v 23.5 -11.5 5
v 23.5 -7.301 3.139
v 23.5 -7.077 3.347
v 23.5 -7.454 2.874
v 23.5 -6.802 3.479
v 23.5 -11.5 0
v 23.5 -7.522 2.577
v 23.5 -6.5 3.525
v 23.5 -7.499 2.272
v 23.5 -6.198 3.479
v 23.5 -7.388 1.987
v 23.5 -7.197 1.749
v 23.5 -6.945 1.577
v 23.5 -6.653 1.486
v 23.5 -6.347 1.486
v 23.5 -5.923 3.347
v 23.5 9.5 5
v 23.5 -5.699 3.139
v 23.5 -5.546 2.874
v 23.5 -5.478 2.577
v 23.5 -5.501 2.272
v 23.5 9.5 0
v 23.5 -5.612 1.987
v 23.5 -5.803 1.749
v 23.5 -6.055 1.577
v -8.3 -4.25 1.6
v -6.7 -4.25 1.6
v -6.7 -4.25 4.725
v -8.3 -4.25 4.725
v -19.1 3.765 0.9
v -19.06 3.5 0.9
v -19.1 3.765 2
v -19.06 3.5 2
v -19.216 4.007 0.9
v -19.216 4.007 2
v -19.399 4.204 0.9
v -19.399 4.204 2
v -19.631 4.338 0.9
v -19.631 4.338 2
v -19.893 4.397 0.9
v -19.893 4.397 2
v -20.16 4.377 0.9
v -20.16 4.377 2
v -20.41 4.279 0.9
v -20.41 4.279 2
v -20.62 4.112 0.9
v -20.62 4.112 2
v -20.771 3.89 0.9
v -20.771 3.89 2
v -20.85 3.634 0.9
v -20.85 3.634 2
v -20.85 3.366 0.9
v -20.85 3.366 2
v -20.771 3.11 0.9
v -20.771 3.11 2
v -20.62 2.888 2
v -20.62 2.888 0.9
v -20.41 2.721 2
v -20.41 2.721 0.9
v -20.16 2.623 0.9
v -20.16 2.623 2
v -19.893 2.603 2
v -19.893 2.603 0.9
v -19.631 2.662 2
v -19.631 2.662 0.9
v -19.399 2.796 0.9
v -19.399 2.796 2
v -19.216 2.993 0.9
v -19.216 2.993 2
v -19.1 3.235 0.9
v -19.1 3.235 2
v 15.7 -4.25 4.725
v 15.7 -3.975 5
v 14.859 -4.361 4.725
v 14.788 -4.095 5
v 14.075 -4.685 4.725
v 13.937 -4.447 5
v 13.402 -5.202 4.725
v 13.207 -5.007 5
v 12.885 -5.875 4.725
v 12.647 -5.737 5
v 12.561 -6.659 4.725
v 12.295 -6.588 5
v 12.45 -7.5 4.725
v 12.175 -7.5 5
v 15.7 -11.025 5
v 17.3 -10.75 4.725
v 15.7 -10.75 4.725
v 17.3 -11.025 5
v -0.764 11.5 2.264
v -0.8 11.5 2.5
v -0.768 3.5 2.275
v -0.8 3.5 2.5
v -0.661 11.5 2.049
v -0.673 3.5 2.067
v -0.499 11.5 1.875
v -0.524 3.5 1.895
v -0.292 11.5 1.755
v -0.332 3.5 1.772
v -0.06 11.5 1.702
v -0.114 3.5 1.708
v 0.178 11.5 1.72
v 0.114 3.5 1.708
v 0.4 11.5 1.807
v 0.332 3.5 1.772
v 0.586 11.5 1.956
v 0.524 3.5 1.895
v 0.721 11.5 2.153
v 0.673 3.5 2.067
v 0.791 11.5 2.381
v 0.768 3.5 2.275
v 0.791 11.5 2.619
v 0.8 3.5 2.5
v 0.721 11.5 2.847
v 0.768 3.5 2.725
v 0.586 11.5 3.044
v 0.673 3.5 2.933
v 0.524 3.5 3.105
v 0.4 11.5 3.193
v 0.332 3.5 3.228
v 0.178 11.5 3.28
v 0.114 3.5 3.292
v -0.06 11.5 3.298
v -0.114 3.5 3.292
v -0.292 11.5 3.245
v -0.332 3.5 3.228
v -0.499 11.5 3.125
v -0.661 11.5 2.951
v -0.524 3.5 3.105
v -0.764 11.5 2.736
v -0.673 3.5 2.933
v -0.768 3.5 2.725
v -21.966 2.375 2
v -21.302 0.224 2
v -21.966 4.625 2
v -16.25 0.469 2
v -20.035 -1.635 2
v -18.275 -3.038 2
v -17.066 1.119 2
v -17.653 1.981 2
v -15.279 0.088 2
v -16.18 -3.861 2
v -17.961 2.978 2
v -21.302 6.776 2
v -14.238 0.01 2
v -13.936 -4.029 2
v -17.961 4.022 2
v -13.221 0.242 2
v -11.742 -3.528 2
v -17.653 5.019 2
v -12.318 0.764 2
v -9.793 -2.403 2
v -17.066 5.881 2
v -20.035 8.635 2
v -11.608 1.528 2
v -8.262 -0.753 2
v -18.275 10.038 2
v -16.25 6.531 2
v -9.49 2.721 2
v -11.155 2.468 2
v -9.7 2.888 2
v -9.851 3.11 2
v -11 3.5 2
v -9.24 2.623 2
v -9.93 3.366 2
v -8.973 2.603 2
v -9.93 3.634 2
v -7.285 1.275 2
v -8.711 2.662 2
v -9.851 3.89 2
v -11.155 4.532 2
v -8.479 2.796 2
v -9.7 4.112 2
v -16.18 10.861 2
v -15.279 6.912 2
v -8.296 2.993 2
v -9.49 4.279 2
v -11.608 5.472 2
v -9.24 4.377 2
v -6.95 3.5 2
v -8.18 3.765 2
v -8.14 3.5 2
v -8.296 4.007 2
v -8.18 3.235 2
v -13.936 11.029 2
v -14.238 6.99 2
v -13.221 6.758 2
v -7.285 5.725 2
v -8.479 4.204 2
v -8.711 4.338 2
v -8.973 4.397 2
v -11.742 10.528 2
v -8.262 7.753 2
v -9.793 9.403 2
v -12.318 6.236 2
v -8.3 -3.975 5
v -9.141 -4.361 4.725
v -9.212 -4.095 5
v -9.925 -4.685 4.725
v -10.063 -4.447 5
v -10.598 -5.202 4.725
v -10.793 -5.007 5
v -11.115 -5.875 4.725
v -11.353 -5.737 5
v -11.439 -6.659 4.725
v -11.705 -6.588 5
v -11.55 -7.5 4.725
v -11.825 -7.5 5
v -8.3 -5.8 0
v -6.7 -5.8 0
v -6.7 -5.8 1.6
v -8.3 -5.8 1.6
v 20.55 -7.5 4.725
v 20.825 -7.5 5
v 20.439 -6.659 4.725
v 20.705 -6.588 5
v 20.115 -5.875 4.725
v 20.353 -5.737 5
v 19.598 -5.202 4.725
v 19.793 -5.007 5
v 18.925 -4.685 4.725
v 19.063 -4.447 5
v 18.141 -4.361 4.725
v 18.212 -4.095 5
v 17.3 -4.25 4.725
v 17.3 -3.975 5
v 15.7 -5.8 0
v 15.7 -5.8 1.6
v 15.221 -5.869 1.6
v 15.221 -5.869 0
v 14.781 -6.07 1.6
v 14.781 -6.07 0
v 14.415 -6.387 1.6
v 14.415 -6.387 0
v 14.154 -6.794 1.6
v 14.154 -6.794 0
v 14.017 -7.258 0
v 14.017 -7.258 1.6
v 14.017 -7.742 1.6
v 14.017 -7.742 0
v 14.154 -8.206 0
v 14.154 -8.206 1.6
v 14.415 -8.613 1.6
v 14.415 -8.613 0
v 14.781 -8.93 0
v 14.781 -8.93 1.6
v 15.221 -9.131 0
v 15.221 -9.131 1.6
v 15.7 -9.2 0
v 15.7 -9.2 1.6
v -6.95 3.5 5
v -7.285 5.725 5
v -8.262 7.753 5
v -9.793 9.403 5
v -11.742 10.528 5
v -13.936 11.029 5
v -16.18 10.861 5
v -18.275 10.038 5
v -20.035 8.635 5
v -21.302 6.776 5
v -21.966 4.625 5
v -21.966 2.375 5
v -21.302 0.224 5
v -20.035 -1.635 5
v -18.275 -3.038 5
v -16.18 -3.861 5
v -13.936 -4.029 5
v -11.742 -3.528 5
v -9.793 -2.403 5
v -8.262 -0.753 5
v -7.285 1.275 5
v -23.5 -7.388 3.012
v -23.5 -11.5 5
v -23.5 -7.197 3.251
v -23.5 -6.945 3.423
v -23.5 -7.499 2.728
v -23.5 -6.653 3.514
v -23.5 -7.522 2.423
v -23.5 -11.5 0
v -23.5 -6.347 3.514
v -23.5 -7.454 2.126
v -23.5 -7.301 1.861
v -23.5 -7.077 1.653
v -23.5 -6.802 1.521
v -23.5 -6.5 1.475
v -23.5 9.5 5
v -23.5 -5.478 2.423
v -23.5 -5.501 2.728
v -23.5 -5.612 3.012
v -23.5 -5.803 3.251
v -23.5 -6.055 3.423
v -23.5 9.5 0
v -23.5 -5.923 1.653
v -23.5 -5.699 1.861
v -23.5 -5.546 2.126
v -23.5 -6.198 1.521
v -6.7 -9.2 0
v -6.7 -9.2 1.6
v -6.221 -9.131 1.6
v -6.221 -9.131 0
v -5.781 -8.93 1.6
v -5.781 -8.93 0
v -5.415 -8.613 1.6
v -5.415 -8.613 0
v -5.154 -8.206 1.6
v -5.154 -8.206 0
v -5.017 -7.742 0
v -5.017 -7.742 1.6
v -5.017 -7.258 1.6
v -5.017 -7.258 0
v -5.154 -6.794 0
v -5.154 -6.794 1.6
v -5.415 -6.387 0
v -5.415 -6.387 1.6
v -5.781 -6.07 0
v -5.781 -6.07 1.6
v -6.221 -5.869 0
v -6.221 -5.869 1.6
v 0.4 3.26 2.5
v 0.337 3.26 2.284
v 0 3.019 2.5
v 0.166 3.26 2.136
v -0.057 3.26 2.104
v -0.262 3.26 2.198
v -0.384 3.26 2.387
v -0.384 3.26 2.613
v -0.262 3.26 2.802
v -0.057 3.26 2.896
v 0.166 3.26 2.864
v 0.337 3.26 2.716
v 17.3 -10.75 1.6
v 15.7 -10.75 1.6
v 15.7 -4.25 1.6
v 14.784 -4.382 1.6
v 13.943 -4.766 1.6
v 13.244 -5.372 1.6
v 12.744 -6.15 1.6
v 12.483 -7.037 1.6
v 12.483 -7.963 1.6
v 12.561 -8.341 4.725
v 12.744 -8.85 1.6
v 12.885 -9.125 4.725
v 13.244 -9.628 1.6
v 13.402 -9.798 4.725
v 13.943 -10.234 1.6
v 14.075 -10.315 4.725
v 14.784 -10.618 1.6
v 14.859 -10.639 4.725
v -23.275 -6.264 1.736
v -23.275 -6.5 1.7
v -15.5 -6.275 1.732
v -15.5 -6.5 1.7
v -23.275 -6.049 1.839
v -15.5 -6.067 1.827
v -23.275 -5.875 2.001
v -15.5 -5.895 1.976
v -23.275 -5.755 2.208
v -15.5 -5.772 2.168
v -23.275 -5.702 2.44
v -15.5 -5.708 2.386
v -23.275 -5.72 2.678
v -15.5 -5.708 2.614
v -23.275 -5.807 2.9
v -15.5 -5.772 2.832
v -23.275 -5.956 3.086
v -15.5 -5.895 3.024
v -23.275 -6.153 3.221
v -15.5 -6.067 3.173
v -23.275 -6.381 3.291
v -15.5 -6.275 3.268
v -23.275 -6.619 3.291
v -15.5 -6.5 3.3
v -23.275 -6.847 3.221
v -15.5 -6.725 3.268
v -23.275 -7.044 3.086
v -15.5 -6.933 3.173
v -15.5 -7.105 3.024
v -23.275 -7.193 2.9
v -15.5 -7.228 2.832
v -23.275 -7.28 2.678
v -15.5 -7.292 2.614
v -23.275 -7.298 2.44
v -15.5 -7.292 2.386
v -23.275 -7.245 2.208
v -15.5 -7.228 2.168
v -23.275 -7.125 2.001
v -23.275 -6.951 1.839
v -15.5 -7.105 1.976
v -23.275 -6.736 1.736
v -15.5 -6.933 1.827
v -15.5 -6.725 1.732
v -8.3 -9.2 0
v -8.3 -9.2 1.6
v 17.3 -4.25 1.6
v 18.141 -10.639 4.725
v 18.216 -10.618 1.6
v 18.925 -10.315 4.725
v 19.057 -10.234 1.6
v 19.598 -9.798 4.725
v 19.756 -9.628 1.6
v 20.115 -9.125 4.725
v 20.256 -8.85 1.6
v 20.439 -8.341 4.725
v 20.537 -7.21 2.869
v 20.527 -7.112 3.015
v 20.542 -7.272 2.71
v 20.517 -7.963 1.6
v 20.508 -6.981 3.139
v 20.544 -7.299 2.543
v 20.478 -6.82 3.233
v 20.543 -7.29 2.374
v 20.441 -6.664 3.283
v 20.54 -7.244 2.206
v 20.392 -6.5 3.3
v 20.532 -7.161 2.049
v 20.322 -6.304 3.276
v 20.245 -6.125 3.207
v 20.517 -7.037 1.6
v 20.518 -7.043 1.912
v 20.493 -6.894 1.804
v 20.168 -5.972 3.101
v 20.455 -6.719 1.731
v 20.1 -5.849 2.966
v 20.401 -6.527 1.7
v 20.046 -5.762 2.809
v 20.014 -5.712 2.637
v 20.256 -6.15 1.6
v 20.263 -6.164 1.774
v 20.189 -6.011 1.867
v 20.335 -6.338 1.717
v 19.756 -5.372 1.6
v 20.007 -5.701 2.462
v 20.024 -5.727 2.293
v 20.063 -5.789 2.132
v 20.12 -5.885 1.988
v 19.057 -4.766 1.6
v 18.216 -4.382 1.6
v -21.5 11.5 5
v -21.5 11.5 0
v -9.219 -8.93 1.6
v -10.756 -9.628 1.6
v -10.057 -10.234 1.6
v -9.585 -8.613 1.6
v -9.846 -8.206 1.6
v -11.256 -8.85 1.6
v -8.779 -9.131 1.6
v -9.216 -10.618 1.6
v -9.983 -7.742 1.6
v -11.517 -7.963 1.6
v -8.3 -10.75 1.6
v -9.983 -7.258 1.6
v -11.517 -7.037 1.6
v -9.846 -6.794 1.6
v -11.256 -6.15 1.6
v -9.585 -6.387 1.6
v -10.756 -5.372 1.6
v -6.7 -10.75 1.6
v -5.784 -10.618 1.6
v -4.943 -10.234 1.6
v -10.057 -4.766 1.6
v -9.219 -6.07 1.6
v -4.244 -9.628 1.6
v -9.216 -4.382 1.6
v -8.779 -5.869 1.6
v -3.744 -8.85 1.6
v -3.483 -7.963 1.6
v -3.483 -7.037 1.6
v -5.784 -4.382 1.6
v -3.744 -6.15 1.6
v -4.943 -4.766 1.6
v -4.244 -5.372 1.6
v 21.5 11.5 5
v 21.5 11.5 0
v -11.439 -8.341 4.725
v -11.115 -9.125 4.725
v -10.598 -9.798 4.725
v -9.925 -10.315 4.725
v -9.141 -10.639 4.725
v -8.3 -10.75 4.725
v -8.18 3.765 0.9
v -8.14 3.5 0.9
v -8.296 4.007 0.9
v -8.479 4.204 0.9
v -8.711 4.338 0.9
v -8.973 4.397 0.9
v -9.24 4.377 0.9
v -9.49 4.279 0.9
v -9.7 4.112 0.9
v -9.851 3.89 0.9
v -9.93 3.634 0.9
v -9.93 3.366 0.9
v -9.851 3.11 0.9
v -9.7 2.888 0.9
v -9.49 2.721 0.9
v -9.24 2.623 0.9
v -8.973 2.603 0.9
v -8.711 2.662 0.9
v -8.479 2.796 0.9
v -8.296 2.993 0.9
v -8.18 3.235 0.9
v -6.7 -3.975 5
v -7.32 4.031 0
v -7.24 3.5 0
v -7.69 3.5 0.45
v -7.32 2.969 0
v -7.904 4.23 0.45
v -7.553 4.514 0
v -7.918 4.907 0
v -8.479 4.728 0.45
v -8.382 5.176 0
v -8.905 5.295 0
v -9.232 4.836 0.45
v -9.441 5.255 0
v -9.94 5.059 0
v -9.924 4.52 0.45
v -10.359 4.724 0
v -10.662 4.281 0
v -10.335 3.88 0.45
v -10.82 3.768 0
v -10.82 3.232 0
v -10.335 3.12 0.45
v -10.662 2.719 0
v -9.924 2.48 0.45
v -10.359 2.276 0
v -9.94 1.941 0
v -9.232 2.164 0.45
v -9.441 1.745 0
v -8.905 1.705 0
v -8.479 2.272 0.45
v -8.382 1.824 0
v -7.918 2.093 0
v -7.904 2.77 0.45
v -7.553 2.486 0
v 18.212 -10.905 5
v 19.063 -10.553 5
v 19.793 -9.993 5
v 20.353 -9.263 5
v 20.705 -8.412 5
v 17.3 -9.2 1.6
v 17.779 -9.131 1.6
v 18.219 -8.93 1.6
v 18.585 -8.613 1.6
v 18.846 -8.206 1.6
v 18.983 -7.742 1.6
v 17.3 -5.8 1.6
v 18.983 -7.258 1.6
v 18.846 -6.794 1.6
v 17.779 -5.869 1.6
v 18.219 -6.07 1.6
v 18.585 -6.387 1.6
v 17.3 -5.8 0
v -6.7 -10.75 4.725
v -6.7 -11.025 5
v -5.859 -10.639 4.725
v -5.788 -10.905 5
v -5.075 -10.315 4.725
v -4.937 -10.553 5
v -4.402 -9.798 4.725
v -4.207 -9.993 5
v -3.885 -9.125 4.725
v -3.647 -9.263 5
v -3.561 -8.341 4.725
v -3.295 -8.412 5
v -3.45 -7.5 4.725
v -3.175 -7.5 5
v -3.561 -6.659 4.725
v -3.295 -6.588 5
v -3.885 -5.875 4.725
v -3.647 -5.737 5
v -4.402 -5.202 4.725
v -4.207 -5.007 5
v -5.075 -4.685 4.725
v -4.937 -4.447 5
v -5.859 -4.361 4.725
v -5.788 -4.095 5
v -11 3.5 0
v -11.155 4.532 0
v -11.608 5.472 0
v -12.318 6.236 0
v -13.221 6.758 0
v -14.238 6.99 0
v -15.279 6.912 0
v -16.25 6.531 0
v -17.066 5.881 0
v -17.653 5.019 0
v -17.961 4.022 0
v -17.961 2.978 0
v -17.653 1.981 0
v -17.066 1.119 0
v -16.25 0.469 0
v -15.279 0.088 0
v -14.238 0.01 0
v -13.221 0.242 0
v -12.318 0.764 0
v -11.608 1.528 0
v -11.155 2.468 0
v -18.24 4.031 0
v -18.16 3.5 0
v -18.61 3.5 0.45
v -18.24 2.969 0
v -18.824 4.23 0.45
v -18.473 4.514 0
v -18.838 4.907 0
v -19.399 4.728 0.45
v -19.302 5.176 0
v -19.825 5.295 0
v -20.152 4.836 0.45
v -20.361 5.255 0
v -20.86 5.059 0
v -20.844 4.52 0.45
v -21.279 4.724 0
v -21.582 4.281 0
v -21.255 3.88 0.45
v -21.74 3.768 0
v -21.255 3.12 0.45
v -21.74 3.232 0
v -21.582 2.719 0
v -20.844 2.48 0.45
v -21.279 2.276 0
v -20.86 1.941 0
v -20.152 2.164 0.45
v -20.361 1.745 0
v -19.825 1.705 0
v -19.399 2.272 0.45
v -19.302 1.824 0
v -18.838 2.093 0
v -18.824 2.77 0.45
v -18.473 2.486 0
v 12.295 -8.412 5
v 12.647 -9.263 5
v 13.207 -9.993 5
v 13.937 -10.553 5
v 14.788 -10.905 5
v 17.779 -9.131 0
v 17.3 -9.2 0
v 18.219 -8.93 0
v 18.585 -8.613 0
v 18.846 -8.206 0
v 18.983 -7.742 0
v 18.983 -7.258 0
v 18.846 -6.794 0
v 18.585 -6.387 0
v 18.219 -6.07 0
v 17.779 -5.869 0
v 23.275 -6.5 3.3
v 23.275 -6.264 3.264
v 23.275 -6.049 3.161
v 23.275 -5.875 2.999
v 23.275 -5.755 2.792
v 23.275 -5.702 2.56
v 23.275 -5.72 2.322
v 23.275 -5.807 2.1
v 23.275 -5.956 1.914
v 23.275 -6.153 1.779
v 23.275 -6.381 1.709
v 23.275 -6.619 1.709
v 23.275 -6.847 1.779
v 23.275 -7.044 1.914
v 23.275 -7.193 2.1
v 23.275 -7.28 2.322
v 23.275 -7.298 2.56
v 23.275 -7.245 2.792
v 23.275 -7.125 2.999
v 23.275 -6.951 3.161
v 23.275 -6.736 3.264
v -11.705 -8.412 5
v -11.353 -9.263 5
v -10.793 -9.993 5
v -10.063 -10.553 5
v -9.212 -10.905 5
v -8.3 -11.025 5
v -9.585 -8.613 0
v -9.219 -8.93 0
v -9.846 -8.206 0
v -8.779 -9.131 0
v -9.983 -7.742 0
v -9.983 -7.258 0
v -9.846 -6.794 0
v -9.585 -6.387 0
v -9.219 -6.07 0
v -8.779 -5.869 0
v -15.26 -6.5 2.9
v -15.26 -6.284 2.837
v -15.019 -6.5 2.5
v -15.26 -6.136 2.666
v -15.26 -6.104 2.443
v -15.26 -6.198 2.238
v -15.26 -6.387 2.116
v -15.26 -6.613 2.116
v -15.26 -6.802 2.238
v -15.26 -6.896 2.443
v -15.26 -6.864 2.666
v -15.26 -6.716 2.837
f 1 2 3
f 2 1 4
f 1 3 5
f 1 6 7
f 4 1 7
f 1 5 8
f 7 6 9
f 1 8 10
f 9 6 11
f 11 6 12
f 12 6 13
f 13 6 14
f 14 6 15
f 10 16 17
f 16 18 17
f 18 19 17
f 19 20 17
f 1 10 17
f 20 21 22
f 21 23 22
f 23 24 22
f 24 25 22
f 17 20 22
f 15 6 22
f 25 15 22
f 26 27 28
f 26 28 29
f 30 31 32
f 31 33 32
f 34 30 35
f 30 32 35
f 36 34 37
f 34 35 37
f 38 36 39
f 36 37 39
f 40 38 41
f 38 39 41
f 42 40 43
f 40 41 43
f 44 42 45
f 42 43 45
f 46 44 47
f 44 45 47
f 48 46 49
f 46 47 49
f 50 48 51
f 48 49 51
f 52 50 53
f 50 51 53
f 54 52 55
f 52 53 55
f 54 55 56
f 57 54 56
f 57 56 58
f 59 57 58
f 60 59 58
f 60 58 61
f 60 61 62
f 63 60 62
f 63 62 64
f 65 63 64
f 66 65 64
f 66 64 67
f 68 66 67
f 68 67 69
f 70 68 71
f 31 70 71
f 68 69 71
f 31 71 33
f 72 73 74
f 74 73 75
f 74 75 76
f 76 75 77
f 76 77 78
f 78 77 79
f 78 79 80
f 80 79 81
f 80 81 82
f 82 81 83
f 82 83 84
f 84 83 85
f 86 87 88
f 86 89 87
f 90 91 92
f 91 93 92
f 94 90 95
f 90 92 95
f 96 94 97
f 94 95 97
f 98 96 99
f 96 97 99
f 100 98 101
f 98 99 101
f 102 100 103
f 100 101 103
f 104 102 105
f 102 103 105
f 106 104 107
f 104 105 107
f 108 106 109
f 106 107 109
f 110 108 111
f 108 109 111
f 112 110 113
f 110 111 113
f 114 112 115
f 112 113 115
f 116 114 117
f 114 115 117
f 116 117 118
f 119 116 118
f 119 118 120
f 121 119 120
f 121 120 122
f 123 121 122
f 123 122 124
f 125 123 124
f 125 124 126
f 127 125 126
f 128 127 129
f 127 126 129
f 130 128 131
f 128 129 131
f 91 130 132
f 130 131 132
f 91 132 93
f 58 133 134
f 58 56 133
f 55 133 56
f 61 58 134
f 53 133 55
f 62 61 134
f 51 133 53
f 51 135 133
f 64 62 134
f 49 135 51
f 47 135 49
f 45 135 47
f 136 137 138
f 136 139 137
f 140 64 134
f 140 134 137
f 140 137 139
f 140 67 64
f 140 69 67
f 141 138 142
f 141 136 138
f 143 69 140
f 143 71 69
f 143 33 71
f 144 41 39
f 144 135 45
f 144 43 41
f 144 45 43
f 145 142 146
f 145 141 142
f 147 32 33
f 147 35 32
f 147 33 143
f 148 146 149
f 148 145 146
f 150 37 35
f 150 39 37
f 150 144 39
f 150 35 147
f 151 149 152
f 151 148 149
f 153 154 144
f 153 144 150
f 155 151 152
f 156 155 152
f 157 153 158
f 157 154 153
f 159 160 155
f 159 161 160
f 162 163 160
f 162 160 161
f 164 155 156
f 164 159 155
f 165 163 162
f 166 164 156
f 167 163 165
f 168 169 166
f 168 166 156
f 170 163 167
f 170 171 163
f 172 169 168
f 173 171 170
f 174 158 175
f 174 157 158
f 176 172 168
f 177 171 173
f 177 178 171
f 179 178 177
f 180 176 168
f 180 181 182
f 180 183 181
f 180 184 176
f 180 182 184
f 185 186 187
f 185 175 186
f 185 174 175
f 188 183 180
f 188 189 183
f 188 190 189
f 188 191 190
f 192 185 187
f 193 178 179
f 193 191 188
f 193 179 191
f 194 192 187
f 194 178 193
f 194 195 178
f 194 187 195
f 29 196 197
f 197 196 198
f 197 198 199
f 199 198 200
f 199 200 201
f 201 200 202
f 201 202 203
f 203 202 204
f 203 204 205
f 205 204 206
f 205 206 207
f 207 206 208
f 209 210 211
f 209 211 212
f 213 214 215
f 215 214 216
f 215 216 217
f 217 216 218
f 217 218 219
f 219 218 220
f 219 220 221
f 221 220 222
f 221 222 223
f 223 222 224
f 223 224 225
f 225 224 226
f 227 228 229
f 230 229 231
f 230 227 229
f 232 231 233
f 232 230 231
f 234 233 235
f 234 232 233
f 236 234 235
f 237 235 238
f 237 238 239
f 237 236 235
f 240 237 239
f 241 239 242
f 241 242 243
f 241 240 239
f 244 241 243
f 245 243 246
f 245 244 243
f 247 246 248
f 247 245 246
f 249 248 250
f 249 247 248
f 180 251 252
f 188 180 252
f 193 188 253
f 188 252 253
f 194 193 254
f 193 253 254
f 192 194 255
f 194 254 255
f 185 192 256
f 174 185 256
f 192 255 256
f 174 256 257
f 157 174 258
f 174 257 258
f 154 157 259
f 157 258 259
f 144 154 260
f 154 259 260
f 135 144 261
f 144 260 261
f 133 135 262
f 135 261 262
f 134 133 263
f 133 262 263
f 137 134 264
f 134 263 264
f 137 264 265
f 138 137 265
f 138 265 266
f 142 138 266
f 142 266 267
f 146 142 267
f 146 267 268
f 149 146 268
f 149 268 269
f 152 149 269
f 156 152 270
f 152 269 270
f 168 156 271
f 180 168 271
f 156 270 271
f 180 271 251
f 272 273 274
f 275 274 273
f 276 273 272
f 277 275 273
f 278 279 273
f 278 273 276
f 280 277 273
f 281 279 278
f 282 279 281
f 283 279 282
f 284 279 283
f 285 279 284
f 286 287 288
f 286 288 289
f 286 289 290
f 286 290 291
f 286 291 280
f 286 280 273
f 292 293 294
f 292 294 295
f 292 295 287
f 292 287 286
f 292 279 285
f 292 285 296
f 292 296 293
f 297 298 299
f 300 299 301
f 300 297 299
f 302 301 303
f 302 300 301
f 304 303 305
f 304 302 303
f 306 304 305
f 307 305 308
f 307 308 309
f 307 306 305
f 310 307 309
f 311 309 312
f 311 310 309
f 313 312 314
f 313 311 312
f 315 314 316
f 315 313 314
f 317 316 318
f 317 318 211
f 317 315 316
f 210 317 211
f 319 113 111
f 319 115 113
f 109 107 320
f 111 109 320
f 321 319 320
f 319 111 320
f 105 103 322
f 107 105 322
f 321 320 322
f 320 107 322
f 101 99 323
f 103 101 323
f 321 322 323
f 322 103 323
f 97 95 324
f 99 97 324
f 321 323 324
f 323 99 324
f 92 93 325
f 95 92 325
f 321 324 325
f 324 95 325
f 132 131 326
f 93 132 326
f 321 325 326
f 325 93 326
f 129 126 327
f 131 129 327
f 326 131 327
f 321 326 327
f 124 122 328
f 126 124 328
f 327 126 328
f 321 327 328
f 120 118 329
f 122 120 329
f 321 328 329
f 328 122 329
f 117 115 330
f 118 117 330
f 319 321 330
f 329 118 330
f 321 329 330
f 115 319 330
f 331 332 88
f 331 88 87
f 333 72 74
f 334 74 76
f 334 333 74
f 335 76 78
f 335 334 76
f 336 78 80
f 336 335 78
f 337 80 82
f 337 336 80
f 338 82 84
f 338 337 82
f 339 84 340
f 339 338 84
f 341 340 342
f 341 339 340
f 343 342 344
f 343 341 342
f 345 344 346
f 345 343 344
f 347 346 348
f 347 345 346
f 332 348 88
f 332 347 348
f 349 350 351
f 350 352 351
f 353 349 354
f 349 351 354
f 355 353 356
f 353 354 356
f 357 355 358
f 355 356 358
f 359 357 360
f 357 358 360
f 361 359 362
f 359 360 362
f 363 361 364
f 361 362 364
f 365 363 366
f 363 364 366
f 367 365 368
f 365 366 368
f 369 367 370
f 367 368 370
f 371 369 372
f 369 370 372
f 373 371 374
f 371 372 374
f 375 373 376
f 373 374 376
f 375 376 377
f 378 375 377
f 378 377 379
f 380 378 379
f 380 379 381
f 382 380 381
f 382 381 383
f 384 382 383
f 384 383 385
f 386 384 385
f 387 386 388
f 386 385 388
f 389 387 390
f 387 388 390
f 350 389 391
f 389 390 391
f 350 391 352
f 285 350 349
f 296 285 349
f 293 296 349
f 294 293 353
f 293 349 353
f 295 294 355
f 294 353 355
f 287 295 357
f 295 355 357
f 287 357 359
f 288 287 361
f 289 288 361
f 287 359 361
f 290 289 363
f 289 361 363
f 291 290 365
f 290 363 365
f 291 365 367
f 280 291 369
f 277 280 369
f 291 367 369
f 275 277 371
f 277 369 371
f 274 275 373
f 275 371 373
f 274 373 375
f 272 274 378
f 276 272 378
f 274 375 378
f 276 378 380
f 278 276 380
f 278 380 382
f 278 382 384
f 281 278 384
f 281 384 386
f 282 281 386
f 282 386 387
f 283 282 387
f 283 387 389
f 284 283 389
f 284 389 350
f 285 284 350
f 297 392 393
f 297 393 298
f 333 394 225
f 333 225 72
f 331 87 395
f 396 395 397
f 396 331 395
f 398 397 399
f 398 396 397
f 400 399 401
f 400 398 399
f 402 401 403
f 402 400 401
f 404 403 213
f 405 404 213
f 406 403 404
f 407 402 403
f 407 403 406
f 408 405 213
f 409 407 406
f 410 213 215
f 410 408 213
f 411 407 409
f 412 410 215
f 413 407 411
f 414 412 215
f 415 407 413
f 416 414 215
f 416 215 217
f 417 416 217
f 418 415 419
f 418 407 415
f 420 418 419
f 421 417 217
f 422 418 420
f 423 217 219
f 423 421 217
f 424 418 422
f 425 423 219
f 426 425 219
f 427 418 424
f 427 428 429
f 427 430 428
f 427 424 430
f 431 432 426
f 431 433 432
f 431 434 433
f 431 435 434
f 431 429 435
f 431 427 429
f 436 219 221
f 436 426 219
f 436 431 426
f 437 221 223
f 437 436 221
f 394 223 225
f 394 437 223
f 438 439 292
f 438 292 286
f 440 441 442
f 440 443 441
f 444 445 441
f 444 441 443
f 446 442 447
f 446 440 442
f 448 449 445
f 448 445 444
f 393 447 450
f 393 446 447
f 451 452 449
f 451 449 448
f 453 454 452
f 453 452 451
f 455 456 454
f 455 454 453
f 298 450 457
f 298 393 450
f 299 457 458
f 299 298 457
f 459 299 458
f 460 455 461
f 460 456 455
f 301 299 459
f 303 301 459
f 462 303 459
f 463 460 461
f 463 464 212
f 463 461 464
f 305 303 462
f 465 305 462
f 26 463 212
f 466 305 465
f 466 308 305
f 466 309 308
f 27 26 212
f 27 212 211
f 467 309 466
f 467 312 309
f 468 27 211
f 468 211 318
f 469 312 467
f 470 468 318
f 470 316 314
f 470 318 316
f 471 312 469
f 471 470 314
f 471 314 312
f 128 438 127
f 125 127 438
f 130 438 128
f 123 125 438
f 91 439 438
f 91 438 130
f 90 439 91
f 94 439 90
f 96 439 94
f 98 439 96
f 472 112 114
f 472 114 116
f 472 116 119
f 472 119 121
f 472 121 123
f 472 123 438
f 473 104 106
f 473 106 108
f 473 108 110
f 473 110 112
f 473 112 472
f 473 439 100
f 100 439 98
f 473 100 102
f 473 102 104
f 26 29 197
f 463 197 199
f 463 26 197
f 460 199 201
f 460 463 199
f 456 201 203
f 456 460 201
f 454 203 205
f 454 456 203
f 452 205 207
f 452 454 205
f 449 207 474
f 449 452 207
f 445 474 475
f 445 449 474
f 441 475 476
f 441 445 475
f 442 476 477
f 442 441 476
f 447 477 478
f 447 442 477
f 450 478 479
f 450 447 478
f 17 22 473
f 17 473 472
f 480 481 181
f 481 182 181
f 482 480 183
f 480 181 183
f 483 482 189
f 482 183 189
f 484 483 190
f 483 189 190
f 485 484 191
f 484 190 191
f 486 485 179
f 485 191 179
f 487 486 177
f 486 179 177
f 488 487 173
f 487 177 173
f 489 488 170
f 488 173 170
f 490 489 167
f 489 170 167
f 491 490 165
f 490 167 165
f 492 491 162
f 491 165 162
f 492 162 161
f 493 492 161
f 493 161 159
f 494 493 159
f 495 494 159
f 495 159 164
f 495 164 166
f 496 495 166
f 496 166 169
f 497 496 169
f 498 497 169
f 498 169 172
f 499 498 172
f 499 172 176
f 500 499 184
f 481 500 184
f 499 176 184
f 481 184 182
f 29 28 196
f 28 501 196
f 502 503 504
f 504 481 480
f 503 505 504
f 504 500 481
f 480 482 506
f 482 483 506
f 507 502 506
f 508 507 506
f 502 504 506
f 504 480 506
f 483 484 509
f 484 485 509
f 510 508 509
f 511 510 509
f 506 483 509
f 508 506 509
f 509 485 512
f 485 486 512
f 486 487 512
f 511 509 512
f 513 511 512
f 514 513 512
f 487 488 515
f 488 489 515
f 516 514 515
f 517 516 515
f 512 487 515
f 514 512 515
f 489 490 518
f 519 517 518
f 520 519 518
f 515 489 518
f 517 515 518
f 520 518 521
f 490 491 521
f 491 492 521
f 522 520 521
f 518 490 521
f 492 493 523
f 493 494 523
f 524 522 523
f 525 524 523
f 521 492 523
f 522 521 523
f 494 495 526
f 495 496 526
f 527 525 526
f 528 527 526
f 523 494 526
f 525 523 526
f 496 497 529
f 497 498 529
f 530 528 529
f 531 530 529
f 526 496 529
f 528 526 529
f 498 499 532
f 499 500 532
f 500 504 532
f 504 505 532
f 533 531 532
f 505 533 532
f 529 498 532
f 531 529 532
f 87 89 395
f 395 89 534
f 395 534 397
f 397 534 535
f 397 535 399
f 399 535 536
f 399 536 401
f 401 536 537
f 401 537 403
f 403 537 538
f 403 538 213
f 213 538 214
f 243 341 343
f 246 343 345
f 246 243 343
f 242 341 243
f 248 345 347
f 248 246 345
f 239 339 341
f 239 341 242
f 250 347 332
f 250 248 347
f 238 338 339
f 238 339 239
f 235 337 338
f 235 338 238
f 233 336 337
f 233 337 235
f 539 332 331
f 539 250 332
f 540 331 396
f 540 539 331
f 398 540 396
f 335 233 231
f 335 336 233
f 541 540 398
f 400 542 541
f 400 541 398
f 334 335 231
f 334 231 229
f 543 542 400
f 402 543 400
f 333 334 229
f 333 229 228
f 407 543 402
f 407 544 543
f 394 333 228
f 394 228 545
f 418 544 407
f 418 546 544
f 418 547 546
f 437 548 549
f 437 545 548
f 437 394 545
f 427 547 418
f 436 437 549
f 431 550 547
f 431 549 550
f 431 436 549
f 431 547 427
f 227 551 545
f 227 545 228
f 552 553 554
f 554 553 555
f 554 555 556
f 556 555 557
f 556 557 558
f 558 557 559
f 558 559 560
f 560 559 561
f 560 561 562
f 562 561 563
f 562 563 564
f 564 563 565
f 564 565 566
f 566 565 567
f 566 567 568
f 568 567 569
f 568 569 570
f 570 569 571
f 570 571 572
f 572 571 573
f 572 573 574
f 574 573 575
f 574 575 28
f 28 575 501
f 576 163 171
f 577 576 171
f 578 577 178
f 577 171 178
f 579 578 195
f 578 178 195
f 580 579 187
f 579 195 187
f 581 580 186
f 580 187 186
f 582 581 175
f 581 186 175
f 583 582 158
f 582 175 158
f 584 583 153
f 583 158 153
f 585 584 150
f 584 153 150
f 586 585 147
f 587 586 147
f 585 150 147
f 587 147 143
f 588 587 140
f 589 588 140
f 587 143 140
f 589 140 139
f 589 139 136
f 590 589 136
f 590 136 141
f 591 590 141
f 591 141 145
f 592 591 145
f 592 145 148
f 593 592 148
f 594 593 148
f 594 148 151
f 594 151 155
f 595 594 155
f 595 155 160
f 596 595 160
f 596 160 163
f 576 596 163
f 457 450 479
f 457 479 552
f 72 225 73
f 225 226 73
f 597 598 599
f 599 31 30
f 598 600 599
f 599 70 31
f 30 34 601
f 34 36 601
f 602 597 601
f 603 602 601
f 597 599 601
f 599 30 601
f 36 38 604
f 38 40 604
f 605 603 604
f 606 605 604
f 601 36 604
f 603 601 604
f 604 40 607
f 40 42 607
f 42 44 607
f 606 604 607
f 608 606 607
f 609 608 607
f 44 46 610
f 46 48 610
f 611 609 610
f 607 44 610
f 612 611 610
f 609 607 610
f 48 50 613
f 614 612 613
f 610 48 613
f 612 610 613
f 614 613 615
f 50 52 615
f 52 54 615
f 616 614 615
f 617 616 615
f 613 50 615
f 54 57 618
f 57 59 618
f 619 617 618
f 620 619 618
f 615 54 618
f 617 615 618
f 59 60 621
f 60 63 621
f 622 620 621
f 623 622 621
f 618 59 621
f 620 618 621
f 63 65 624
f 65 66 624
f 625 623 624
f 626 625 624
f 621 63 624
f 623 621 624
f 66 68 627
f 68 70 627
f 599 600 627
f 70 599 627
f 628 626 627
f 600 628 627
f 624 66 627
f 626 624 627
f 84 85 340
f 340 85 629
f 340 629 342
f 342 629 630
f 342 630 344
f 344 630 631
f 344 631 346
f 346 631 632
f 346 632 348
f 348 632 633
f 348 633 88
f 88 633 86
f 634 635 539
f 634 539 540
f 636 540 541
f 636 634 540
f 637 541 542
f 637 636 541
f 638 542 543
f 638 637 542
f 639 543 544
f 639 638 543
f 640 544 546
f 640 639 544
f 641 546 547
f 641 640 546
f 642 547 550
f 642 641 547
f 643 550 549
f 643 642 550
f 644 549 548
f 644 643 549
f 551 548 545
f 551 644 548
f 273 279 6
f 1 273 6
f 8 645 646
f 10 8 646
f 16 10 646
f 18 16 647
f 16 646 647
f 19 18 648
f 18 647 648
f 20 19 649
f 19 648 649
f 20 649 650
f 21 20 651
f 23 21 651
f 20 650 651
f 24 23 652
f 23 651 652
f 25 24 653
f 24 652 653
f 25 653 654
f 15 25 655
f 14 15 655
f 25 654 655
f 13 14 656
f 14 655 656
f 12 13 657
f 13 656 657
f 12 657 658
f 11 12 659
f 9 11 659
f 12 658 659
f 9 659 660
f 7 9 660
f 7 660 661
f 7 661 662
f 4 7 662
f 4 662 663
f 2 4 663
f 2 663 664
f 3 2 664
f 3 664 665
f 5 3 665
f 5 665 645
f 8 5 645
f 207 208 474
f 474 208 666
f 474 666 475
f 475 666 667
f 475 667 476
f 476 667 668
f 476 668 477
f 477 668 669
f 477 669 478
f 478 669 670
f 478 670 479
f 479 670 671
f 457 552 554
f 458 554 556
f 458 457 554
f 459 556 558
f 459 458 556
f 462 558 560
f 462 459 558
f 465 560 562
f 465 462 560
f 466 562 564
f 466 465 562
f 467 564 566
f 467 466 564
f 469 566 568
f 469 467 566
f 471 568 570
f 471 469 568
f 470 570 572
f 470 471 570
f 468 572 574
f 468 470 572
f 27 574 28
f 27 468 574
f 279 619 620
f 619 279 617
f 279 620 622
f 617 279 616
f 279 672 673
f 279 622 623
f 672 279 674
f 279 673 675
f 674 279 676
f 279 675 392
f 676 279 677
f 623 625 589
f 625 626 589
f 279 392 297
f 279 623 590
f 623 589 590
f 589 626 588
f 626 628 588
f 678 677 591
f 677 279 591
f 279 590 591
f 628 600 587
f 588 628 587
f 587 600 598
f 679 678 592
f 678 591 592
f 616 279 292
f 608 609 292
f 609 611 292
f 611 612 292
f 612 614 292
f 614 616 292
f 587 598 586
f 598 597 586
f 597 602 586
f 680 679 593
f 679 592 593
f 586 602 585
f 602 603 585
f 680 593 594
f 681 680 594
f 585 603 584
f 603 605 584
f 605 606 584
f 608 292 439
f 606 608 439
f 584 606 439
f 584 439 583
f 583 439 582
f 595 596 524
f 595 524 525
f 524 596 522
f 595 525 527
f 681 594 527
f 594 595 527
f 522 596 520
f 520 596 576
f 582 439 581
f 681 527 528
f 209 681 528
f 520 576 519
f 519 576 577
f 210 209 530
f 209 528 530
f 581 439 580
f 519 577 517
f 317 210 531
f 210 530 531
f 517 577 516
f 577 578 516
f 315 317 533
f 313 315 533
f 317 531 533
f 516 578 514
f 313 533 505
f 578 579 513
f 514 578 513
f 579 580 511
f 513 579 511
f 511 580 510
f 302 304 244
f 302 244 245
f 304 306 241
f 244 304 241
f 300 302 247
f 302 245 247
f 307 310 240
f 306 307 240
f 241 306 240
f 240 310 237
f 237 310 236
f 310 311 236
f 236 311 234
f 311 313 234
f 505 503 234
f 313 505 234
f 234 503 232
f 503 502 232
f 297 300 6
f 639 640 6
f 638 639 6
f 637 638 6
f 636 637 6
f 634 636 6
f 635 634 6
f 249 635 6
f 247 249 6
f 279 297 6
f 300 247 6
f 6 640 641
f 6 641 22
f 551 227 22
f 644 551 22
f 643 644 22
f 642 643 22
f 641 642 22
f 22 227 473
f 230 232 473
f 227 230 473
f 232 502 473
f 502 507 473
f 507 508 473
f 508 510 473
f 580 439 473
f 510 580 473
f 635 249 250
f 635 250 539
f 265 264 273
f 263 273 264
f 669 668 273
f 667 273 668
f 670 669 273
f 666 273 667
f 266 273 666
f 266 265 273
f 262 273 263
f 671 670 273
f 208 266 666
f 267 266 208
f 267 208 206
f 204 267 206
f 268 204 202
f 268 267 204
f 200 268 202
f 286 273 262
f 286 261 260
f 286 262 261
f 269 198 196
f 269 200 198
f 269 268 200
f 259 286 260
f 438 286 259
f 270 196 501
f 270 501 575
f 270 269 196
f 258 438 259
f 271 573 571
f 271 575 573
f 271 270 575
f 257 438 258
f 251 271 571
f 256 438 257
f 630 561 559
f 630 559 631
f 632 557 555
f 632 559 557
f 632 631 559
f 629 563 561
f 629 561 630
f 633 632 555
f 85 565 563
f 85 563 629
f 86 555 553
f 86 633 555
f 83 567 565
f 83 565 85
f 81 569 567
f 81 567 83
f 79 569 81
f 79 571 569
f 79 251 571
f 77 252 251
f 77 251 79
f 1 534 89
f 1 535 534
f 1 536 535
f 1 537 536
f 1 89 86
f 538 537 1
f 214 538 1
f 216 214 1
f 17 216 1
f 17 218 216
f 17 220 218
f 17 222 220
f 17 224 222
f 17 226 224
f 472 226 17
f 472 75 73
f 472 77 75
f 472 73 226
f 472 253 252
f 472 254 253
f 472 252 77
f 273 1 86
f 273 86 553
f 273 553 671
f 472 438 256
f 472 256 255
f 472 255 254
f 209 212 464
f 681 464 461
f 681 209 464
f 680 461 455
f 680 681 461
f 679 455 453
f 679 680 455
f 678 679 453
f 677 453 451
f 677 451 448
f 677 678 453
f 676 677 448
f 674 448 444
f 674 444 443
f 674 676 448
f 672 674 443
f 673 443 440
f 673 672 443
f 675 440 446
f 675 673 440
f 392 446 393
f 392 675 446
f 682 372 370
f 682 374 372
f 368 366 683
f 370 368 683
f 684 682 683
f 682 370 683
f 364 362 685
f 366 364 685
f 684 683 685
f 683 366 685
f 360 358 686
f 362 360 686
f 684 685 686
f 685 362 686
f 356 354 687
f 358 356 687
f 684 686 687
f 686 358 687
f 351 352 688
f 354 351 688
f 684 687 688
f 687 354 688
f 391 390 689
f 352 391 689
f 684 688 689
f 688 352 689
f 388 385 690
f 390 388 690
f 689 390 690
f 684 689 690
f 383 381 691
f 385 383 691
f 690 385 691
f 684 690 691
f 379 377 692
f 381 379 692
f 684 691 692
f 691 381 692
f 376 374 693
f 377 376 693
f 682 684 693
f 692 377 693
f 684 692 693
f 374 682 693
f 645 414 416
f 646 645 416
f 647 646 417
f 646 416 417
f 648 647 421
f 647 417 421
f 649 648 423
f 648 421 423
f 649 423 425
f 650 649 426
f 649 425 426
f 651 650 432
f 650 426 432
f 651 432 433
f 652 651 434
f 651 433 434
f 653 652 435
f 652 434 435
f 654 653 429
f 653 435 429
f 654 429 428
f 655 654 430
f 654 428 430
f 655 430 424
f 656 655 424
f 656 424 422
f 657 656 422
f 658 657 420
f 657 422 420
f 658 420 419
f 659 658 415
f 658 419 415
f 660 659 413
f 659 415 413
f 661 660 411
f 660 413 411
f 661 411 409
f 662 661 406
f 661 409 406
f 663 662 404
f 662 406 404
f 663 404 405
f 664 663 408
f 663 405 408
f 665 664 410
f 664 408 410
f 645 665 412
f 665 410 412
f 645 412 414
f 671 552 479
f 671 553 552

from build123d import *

# Parameters (mm, degrees)
SKIZZE1_W                                            = 47
SKIZZE1_H                                            = 23
AUFSATZ_LINEAR_AUSTRAGEN1_DEPTH                      = 5
SKIZZE2_R                                            = 7.55
SCHNITT_LINEAR_AUSTRAGEN1_DEPTH                      = 3
SKIZZE3_R                                            = 3.5
SCHNITT_LINEAR_AUSTRAGEN2_DEPTH                      = 27.636441204
FORMSENKUNG_F_R_M1_6_SENKSCHRAUBE_MIT_SC_D           = 1.8
FORMSENKUNG_F_R_M1_6_SENKSCHRAUBE_MIT_SC_CSINK_D     = 3.6
FORMSENKUNG_F_R_M1_6_SENKSCHRAUBE_MIT_SC_CSINK_ANGLE = 90
M2_GEWINDEBOHRUNG1_D                                 = 1.6
M2_GEWINDEBOHRUNG1_DEPTH                             = 8
M2_GEWINDEBOHRUNG1_CSINK_D                           = 2.05
M2_GEWINDEBOHRUNG1_CSINK_ANGLE                       = 90
M2_GEWINDEBOHRUNG1_TIP                               = 0.480688495
M2_GEWINDEBOHRUNG2_D                                 = 1.6
M2_GEWINDEBOHRUNG2_DEPTH                             = 8
M2_GEWINDEBOHRUNG2_CSINK_D                           = 2.05
M2_GEWINDEBOHRUNG2_CSINK_ANGLE                       = 90
M2_GEWINDEBOHRUNG2_TIP                               = 0.480688495
M2_GEWINDEBOHRUNG3_D                                 = 1.6
M2_GEWINDEBOHRUNG3_DEPTH                             = 8
M2_GEWINDEBOHRUNG3_TIP                               = 0.480688495
FASE1_SIZE                                           = 2
STIRNSENKUNG_START                                   = 1.6
STIRNSENKUNG_LANGLOCH_F_R_M3_ZYLINDERSCH_DEPTH       = 3.4
STIRNSENKUNG_START_2                                 = -1
STIRNSENKUNG_LANGLOCH_F_R_M3_ZYLINDE_3_DEPTH         = 2.6


with BuildPart() as part:
    # Skizze1 → Aufsatz-Linear austragen1 (new body)
    with BuildSketch(Plane.XY):
        Rectangle(SKIZZE1_W, SKIZZE1_H)
    extrude(amount=AUFSATZ_LINEAR_AUSTRAGEN1_DEPTH)

    # Skizze2 → Schnitt-Linear austragen1 (cut)
    with BuildSketch(Plane.XY.offset(5)):
        with Locations((-14.5, 3.5)):
            Circle(SKIZZE2_R)
    extrude(amount=-SCHNITT_LINEAR_AUSTRAGEN1_DEPTH, mode=Mode.SUBTRACT)

    # Skizze3 → Schnitt-Linear austragen2 (cut, through all)
    with BuildSketch(Plane.XY.offset(5)):
        with Locations((-14.5, 3.5)):
            Circle(SKIZZE3_R)
    extrude(amount=-SCHNITT_LINEAR_AUSTRAGEN2_DEPTH, mode=Mode.SUBTRACT)

    # Formsenkung für M1.6 Senkschraube mit Schlitz/Kreuzschlitz1 (through all)
    with Locations(Plane(origin=(0, 0, 0), x_dir=(-1, 0, 0), z_dir=(0, 0, -1))):
        with Locations((9.04, 3.5), (19.96, 3.5)):
            CounterSinkHole(FORMSENKUNG_F_R_M1_6_SENKSCHRAUBE_MIT_SC_D / 2, FORMSENKUNG_F_R_M1_6_SENKSCHRAUBE_MIT_SC_CSINK_D / 2, counter_sink_angle=FORMSENKUNG_F_R_M1_6_SENKSCHRAUBE_MIT_SC_CSINK_ANGLE)

    # M2 Gewindebohrung1
    with Locations(Plane.ZY.offset(23.5)):
        with Locations((2.5, -6.5)):
            CounterSinkHole(M2_GEWINDEBOHRUNG1_D / 2, M2_GEWINDEBOHRUNG1_CSINK_D / 2, depth=M2_GEWINDEBOHRUNG1_DEPTH, counter_sink_angle=M2_GEWINDEBOHRUNG1_CSINK_ANGLE)
            with Locations((0, 0, -(M2_GEWINDEBOHRUNG1_DEPTH + M2_GEWINDEBOHRUNG1_TIP / 2))):  # 118° drill point
                Cone(0, M2_GEWINDEBOHRUNG1_D / 2, M2_GEWINDEBOHRUNG1_TIP, mode=Mode.SUBTRACT)

    # M2 Gewindebohrung2
    with Locations(Plane(origin=(23.5, 0, 0), x_dir=(0, 0, -1), z_dir=(1, 0, 0))):
        with Locations((-2.5, -6.5)):
            CounterSinkHole(M2_GEWINDEBOHRUNG2_D / 2, M2_GEWINDEBOHRUNG2_CSINK_D / 2, depth=M2_GEWINDEBOHRUNG2_DEPTH, counter_sink_angle=M2_GEWINDEBOHRUNG2_CSINK_ANGLE)
            with Locations((0, 0, -(M2_GEWINDEBOHRUNG2_DEPTH + M2_GEWINDEBOHRUNG2_TIP / 2))):  # 118° drill point
                Cone(0, M2_GEWINDEBOHRUNG2_D / 2, M2_GEWINDEBOHRUNG2_TIP, mode=Mode.SUBTRACT)

    # M2 Gewindebohrung3
    with Locations(Plane(origin=(0, 11.5, 0), x_dir=(1, 0, 0), z_dir=(0, 1, 0))):
        with Locations((0, -2.5)):
            Hole(M2_GEWINDEBOHRUNG3_D / 2, depth=M2_GEWINDEBOHRUNG3_DEPTH)
            with Locations((0, 0, -(M2_GEWINDEBOHRUNG3_DEPTH + M2_GEWINDEBOHRUNG3_TIP / 2))):  # 118° drill point
                Cone(0, M2_GEWINDEBOHRUNG3_D / 2, M2_GEWINDEBOHRUNG3_TIP, mode=Mode.SUBTRACT)

    # Fase1
    fase1_edges = [part.edges().sort_by_distance(p)[0] for p in [
        (-23.5, 11.5, 2.5),
        (23.5, 11.5, 2.5),
    ]]
    chamfer(fase1_edges, length=FASE1_SIZE)

    # Stirnsenkung Langloch für M3 Zylinderschraube mit Innensechskant2: read off the stored shape, not the designer's step
    # Stirnsenkung Langloch f_r M3 Zylinde 2 → Stirnsenkung Langloch für M3 Zylinderschraube mit Innensechskant2 (cut)
    with BuildSketch(Plane.XY.offset(STIRNSENKUNG_START)):
        with BuildLine():
            Line((-8.3, -10.75), (-6.7, -10.75))
            ThreePointArc((-6.7, -10.75), (-3.45, -7.5), (-6.7, -4.25))
            Line((-6.7, -4.25), (-8.3, -4.25))
            ThreePointArc((-8.3, -4.25), (-11.55, -7.5), (-8.3, -10.75))
        make_face()
        with BuildLine():
            ThreePointArc((17.3, -10.75), (20.55, -7.5), (17.3, -4.25))
            Line((17.3, -4.25), (15.7, -4.25))
            ThreePointArc((15.7, -4.25), (12.45, -7.5), (15.7, -10.75))
            Line((15.7, -10.75), (17.3, -10.75))
        make_face()
    extrude(amount=STIRNSENKUNG_LANGLOCH_F_R_M3_ZYLINDERSCH_DEPTH, mode=Mode.SUBTRACT)

    # Stirnsenkung Langloch f_r M3 Zylinde 3 o → Stirnsenkung Langloch f_r M3 Zylinde 3 (cut)
    with BuildSketch(Plane.XY.offset(STIRNSENKUNG_START_2)):
        with BuildLine():
            Line((-8.3, -9.2), (-6.7, -9.2))
            ThreePointArc((-6.7, -9.2), (-5, -7.5), (-6.7, -5.8))
            Line((-6.7, -5.8), (-8.3, -5.8))
            ThreePointArc((-8.3, -5.8), (-10, -7.5), (-8.3, -9.2))
        make_face()
        with BuildLine():
            ThreePointArc((17.3, -9.2), (19, -7.5), (17.3, -5.8))
            Line((17.3, -5.8), (15.7, -5.8))
            ThreePointArc((15.7, -5.8), (14, -7.5), (15.7, -9.2))
            Line((15.7, -9.2), (17.3, -9.2))
        make_face()
    extrude(amount=STIRNSENKUNG_LANGLOCH_F_R_M3_ZYLINDE_3_DEPTH, mode=Mode.SUBTRACT)

    # Stirnsenkung Langloch f_r M3 Zylinde 4: loft between two sections, ruled curve by curve
    stirnsenkung_langloch_f_r_m3_zylinde_4_from = [
        Edge.make_three_point_arc((-6.7, -10.75, 4.725), (-4.401902961, -9.798097039, 4.725), (-3.45, -7.5, 4.725)),
        Edge.make_three_point_arc((-3.45, -7.5, 4.725), (-4.401902961, -5.201902961, 4.725), (-6.7, -4.25, 4.725)),
        Edge.make_three_point_arc((-8.3, -4.25, 4.725), (-10.598097039, -5.201902961, 4.725), (-11.55, -7.5, 4.725)),
        Edge.make_three_point_arc((-11.55, -7.5, 4.725), (-10.598097039, -9.798097039, 4.725), (-8.3, -10.75, 4.725)),
        Edge.make_line((-6.7, -4.25, 4.725), (-8.3, -4.25, 4.725)),
        Edge.make_line((-6.7, -10.75, 4.725), (-8.3, -10.75, 4.725)),
    ]
    stirnsenkung_langloch_f_r_m3_zylinde_4_to = [
        Edge.make_three_point_arc((-6.7, -11.025, 5), (-4.207448596, -9.992551404, 5), (-3.175, -7.5, 5)),
        Edge.make_three_point_arc((-3.175, -7.5, 5), (-4.207448596, -5.007448596, 5), (-6.7, -3.975, 5)),
        Edge.make_three_point_arc((-8.3, -3.975, 5), (-10.792551404, -5.007448596, 5), (-11.825, -7.5, 5)),
        Edge.make_three_point_arc((-11.825, -7.5, 5), (-10.792551404, -9.992551404, 5), (-8.3, -11.025, 5)),
        Edge.make_line((-6.7, -3.975, 5), (-8.3, -3.975, 5)),
        Edge.make_line((-6.7, -11.025, 5), (-8.3, -11.025, 5)),
    ]
    stirnsenkung_langloch_f_r_m3_zylinde_4 = Solid(Shell([*[Face.make_surface_from_curves(stirnsenkung_langloch_f_r_m3_zylinde_4_from[k], stirnsenkung_langloch_f_r_m3_zylinde_4_to[k]) for k in range(6)], Face(Wire(stirnsenkung_langloch_f_r_m3_zylinde_4_from)), Face(Wire(stirnsenkung_langloch_f_r_m3_zylinde_4_to))]))
    add(stirnsenkung_langloch_f_r_m3_zylinde_4, mode=Mode.SUBTRACT)

    # Stirnsenkung Langloch f_r M3 Zylinde 5: loft between two sections, ruled curve by curve
    stirnsenkung_langloch_f_r_m3_zylinde_5_from = [
        Edge.make_three_point_arc((17.3, -10.75, 4.725), (19.598097039, -9.798097039, 4.725), (20.55, -7.5, 4.725)),
        Edge.make_three_point_arc((20.55, -7.5, 4.725), (19.598097039, -5.201902961, 4.725), (17.3, -4.25, 4.725)),
        Edge.make_three_point_arc((15.7, -4.25, 4.725), (13.401902961, -5.201902961, 4.725), (12.45, -7.5, 4.725)),
        Edge.make_three_point_arc((12.45, -7.5, 4.725), (13.401902961, -9.798097039, 4.725), (15.7, -10.75, 4.725)),
        Edge.make_line((17.3, -4.25, 4.725), (15.7, -4.25, 4.725)),
        Edge.make_line((17.3, -10.75, 4.725), (15.7, -10.75, 4.725)),
    ]
    stirnsenkung_langloch_f_r_m3_zylinde_5_to = [
        Edge.make_three_point_arc((17.3, -11.025, 5), (19.792551404, -9.992551404, 5), (20.825, -7.5, 5)),
        Edge.make_three_point_arc((20.825, -7.5, 5), (19.792551404, -5.007448596, 5), (17.3, -3.975, 5)),
        Edge.make_three_point_arc((15.7, -3.975, 5), (13.207448596, -5.007448596, 5), (12.175, -7.5, 5)),
        Edge.make_three_point_arc((12.175, -7.5, 5), (13.207448596, -9.992551404, 5), (15.7, -11.025, 5)),
        Edge.make_line((17.3, -3.975, 5), (15.7, -3.975, 5)),
        Edge.make_line((17.3, -11.025, 5), (15.7, -11.025, 5)),
    ]
    stirnsenkung_langloch_f_r_m3_zylinde_5 = Solid(Shell([*[Face.make_surface_from_curves(stirnsenkung_langloch_f_r_m3_zylinde_5_from[k], stirnsenkung_langloch_f_r_m3_zylinde_5_to[k]) for k in range(6)], Face(Wire(stirnsenkung_langloch_f_r_m3_zylinde_5_from)), Face(Wire(stirnsenkung_langloch_f_r_m3_zylinde_5_to))]))
    add(stirnsenkung_langloch_f_r_m3_zylinde_5, mode=Mode.SUBTRACT)


solid = part.part
